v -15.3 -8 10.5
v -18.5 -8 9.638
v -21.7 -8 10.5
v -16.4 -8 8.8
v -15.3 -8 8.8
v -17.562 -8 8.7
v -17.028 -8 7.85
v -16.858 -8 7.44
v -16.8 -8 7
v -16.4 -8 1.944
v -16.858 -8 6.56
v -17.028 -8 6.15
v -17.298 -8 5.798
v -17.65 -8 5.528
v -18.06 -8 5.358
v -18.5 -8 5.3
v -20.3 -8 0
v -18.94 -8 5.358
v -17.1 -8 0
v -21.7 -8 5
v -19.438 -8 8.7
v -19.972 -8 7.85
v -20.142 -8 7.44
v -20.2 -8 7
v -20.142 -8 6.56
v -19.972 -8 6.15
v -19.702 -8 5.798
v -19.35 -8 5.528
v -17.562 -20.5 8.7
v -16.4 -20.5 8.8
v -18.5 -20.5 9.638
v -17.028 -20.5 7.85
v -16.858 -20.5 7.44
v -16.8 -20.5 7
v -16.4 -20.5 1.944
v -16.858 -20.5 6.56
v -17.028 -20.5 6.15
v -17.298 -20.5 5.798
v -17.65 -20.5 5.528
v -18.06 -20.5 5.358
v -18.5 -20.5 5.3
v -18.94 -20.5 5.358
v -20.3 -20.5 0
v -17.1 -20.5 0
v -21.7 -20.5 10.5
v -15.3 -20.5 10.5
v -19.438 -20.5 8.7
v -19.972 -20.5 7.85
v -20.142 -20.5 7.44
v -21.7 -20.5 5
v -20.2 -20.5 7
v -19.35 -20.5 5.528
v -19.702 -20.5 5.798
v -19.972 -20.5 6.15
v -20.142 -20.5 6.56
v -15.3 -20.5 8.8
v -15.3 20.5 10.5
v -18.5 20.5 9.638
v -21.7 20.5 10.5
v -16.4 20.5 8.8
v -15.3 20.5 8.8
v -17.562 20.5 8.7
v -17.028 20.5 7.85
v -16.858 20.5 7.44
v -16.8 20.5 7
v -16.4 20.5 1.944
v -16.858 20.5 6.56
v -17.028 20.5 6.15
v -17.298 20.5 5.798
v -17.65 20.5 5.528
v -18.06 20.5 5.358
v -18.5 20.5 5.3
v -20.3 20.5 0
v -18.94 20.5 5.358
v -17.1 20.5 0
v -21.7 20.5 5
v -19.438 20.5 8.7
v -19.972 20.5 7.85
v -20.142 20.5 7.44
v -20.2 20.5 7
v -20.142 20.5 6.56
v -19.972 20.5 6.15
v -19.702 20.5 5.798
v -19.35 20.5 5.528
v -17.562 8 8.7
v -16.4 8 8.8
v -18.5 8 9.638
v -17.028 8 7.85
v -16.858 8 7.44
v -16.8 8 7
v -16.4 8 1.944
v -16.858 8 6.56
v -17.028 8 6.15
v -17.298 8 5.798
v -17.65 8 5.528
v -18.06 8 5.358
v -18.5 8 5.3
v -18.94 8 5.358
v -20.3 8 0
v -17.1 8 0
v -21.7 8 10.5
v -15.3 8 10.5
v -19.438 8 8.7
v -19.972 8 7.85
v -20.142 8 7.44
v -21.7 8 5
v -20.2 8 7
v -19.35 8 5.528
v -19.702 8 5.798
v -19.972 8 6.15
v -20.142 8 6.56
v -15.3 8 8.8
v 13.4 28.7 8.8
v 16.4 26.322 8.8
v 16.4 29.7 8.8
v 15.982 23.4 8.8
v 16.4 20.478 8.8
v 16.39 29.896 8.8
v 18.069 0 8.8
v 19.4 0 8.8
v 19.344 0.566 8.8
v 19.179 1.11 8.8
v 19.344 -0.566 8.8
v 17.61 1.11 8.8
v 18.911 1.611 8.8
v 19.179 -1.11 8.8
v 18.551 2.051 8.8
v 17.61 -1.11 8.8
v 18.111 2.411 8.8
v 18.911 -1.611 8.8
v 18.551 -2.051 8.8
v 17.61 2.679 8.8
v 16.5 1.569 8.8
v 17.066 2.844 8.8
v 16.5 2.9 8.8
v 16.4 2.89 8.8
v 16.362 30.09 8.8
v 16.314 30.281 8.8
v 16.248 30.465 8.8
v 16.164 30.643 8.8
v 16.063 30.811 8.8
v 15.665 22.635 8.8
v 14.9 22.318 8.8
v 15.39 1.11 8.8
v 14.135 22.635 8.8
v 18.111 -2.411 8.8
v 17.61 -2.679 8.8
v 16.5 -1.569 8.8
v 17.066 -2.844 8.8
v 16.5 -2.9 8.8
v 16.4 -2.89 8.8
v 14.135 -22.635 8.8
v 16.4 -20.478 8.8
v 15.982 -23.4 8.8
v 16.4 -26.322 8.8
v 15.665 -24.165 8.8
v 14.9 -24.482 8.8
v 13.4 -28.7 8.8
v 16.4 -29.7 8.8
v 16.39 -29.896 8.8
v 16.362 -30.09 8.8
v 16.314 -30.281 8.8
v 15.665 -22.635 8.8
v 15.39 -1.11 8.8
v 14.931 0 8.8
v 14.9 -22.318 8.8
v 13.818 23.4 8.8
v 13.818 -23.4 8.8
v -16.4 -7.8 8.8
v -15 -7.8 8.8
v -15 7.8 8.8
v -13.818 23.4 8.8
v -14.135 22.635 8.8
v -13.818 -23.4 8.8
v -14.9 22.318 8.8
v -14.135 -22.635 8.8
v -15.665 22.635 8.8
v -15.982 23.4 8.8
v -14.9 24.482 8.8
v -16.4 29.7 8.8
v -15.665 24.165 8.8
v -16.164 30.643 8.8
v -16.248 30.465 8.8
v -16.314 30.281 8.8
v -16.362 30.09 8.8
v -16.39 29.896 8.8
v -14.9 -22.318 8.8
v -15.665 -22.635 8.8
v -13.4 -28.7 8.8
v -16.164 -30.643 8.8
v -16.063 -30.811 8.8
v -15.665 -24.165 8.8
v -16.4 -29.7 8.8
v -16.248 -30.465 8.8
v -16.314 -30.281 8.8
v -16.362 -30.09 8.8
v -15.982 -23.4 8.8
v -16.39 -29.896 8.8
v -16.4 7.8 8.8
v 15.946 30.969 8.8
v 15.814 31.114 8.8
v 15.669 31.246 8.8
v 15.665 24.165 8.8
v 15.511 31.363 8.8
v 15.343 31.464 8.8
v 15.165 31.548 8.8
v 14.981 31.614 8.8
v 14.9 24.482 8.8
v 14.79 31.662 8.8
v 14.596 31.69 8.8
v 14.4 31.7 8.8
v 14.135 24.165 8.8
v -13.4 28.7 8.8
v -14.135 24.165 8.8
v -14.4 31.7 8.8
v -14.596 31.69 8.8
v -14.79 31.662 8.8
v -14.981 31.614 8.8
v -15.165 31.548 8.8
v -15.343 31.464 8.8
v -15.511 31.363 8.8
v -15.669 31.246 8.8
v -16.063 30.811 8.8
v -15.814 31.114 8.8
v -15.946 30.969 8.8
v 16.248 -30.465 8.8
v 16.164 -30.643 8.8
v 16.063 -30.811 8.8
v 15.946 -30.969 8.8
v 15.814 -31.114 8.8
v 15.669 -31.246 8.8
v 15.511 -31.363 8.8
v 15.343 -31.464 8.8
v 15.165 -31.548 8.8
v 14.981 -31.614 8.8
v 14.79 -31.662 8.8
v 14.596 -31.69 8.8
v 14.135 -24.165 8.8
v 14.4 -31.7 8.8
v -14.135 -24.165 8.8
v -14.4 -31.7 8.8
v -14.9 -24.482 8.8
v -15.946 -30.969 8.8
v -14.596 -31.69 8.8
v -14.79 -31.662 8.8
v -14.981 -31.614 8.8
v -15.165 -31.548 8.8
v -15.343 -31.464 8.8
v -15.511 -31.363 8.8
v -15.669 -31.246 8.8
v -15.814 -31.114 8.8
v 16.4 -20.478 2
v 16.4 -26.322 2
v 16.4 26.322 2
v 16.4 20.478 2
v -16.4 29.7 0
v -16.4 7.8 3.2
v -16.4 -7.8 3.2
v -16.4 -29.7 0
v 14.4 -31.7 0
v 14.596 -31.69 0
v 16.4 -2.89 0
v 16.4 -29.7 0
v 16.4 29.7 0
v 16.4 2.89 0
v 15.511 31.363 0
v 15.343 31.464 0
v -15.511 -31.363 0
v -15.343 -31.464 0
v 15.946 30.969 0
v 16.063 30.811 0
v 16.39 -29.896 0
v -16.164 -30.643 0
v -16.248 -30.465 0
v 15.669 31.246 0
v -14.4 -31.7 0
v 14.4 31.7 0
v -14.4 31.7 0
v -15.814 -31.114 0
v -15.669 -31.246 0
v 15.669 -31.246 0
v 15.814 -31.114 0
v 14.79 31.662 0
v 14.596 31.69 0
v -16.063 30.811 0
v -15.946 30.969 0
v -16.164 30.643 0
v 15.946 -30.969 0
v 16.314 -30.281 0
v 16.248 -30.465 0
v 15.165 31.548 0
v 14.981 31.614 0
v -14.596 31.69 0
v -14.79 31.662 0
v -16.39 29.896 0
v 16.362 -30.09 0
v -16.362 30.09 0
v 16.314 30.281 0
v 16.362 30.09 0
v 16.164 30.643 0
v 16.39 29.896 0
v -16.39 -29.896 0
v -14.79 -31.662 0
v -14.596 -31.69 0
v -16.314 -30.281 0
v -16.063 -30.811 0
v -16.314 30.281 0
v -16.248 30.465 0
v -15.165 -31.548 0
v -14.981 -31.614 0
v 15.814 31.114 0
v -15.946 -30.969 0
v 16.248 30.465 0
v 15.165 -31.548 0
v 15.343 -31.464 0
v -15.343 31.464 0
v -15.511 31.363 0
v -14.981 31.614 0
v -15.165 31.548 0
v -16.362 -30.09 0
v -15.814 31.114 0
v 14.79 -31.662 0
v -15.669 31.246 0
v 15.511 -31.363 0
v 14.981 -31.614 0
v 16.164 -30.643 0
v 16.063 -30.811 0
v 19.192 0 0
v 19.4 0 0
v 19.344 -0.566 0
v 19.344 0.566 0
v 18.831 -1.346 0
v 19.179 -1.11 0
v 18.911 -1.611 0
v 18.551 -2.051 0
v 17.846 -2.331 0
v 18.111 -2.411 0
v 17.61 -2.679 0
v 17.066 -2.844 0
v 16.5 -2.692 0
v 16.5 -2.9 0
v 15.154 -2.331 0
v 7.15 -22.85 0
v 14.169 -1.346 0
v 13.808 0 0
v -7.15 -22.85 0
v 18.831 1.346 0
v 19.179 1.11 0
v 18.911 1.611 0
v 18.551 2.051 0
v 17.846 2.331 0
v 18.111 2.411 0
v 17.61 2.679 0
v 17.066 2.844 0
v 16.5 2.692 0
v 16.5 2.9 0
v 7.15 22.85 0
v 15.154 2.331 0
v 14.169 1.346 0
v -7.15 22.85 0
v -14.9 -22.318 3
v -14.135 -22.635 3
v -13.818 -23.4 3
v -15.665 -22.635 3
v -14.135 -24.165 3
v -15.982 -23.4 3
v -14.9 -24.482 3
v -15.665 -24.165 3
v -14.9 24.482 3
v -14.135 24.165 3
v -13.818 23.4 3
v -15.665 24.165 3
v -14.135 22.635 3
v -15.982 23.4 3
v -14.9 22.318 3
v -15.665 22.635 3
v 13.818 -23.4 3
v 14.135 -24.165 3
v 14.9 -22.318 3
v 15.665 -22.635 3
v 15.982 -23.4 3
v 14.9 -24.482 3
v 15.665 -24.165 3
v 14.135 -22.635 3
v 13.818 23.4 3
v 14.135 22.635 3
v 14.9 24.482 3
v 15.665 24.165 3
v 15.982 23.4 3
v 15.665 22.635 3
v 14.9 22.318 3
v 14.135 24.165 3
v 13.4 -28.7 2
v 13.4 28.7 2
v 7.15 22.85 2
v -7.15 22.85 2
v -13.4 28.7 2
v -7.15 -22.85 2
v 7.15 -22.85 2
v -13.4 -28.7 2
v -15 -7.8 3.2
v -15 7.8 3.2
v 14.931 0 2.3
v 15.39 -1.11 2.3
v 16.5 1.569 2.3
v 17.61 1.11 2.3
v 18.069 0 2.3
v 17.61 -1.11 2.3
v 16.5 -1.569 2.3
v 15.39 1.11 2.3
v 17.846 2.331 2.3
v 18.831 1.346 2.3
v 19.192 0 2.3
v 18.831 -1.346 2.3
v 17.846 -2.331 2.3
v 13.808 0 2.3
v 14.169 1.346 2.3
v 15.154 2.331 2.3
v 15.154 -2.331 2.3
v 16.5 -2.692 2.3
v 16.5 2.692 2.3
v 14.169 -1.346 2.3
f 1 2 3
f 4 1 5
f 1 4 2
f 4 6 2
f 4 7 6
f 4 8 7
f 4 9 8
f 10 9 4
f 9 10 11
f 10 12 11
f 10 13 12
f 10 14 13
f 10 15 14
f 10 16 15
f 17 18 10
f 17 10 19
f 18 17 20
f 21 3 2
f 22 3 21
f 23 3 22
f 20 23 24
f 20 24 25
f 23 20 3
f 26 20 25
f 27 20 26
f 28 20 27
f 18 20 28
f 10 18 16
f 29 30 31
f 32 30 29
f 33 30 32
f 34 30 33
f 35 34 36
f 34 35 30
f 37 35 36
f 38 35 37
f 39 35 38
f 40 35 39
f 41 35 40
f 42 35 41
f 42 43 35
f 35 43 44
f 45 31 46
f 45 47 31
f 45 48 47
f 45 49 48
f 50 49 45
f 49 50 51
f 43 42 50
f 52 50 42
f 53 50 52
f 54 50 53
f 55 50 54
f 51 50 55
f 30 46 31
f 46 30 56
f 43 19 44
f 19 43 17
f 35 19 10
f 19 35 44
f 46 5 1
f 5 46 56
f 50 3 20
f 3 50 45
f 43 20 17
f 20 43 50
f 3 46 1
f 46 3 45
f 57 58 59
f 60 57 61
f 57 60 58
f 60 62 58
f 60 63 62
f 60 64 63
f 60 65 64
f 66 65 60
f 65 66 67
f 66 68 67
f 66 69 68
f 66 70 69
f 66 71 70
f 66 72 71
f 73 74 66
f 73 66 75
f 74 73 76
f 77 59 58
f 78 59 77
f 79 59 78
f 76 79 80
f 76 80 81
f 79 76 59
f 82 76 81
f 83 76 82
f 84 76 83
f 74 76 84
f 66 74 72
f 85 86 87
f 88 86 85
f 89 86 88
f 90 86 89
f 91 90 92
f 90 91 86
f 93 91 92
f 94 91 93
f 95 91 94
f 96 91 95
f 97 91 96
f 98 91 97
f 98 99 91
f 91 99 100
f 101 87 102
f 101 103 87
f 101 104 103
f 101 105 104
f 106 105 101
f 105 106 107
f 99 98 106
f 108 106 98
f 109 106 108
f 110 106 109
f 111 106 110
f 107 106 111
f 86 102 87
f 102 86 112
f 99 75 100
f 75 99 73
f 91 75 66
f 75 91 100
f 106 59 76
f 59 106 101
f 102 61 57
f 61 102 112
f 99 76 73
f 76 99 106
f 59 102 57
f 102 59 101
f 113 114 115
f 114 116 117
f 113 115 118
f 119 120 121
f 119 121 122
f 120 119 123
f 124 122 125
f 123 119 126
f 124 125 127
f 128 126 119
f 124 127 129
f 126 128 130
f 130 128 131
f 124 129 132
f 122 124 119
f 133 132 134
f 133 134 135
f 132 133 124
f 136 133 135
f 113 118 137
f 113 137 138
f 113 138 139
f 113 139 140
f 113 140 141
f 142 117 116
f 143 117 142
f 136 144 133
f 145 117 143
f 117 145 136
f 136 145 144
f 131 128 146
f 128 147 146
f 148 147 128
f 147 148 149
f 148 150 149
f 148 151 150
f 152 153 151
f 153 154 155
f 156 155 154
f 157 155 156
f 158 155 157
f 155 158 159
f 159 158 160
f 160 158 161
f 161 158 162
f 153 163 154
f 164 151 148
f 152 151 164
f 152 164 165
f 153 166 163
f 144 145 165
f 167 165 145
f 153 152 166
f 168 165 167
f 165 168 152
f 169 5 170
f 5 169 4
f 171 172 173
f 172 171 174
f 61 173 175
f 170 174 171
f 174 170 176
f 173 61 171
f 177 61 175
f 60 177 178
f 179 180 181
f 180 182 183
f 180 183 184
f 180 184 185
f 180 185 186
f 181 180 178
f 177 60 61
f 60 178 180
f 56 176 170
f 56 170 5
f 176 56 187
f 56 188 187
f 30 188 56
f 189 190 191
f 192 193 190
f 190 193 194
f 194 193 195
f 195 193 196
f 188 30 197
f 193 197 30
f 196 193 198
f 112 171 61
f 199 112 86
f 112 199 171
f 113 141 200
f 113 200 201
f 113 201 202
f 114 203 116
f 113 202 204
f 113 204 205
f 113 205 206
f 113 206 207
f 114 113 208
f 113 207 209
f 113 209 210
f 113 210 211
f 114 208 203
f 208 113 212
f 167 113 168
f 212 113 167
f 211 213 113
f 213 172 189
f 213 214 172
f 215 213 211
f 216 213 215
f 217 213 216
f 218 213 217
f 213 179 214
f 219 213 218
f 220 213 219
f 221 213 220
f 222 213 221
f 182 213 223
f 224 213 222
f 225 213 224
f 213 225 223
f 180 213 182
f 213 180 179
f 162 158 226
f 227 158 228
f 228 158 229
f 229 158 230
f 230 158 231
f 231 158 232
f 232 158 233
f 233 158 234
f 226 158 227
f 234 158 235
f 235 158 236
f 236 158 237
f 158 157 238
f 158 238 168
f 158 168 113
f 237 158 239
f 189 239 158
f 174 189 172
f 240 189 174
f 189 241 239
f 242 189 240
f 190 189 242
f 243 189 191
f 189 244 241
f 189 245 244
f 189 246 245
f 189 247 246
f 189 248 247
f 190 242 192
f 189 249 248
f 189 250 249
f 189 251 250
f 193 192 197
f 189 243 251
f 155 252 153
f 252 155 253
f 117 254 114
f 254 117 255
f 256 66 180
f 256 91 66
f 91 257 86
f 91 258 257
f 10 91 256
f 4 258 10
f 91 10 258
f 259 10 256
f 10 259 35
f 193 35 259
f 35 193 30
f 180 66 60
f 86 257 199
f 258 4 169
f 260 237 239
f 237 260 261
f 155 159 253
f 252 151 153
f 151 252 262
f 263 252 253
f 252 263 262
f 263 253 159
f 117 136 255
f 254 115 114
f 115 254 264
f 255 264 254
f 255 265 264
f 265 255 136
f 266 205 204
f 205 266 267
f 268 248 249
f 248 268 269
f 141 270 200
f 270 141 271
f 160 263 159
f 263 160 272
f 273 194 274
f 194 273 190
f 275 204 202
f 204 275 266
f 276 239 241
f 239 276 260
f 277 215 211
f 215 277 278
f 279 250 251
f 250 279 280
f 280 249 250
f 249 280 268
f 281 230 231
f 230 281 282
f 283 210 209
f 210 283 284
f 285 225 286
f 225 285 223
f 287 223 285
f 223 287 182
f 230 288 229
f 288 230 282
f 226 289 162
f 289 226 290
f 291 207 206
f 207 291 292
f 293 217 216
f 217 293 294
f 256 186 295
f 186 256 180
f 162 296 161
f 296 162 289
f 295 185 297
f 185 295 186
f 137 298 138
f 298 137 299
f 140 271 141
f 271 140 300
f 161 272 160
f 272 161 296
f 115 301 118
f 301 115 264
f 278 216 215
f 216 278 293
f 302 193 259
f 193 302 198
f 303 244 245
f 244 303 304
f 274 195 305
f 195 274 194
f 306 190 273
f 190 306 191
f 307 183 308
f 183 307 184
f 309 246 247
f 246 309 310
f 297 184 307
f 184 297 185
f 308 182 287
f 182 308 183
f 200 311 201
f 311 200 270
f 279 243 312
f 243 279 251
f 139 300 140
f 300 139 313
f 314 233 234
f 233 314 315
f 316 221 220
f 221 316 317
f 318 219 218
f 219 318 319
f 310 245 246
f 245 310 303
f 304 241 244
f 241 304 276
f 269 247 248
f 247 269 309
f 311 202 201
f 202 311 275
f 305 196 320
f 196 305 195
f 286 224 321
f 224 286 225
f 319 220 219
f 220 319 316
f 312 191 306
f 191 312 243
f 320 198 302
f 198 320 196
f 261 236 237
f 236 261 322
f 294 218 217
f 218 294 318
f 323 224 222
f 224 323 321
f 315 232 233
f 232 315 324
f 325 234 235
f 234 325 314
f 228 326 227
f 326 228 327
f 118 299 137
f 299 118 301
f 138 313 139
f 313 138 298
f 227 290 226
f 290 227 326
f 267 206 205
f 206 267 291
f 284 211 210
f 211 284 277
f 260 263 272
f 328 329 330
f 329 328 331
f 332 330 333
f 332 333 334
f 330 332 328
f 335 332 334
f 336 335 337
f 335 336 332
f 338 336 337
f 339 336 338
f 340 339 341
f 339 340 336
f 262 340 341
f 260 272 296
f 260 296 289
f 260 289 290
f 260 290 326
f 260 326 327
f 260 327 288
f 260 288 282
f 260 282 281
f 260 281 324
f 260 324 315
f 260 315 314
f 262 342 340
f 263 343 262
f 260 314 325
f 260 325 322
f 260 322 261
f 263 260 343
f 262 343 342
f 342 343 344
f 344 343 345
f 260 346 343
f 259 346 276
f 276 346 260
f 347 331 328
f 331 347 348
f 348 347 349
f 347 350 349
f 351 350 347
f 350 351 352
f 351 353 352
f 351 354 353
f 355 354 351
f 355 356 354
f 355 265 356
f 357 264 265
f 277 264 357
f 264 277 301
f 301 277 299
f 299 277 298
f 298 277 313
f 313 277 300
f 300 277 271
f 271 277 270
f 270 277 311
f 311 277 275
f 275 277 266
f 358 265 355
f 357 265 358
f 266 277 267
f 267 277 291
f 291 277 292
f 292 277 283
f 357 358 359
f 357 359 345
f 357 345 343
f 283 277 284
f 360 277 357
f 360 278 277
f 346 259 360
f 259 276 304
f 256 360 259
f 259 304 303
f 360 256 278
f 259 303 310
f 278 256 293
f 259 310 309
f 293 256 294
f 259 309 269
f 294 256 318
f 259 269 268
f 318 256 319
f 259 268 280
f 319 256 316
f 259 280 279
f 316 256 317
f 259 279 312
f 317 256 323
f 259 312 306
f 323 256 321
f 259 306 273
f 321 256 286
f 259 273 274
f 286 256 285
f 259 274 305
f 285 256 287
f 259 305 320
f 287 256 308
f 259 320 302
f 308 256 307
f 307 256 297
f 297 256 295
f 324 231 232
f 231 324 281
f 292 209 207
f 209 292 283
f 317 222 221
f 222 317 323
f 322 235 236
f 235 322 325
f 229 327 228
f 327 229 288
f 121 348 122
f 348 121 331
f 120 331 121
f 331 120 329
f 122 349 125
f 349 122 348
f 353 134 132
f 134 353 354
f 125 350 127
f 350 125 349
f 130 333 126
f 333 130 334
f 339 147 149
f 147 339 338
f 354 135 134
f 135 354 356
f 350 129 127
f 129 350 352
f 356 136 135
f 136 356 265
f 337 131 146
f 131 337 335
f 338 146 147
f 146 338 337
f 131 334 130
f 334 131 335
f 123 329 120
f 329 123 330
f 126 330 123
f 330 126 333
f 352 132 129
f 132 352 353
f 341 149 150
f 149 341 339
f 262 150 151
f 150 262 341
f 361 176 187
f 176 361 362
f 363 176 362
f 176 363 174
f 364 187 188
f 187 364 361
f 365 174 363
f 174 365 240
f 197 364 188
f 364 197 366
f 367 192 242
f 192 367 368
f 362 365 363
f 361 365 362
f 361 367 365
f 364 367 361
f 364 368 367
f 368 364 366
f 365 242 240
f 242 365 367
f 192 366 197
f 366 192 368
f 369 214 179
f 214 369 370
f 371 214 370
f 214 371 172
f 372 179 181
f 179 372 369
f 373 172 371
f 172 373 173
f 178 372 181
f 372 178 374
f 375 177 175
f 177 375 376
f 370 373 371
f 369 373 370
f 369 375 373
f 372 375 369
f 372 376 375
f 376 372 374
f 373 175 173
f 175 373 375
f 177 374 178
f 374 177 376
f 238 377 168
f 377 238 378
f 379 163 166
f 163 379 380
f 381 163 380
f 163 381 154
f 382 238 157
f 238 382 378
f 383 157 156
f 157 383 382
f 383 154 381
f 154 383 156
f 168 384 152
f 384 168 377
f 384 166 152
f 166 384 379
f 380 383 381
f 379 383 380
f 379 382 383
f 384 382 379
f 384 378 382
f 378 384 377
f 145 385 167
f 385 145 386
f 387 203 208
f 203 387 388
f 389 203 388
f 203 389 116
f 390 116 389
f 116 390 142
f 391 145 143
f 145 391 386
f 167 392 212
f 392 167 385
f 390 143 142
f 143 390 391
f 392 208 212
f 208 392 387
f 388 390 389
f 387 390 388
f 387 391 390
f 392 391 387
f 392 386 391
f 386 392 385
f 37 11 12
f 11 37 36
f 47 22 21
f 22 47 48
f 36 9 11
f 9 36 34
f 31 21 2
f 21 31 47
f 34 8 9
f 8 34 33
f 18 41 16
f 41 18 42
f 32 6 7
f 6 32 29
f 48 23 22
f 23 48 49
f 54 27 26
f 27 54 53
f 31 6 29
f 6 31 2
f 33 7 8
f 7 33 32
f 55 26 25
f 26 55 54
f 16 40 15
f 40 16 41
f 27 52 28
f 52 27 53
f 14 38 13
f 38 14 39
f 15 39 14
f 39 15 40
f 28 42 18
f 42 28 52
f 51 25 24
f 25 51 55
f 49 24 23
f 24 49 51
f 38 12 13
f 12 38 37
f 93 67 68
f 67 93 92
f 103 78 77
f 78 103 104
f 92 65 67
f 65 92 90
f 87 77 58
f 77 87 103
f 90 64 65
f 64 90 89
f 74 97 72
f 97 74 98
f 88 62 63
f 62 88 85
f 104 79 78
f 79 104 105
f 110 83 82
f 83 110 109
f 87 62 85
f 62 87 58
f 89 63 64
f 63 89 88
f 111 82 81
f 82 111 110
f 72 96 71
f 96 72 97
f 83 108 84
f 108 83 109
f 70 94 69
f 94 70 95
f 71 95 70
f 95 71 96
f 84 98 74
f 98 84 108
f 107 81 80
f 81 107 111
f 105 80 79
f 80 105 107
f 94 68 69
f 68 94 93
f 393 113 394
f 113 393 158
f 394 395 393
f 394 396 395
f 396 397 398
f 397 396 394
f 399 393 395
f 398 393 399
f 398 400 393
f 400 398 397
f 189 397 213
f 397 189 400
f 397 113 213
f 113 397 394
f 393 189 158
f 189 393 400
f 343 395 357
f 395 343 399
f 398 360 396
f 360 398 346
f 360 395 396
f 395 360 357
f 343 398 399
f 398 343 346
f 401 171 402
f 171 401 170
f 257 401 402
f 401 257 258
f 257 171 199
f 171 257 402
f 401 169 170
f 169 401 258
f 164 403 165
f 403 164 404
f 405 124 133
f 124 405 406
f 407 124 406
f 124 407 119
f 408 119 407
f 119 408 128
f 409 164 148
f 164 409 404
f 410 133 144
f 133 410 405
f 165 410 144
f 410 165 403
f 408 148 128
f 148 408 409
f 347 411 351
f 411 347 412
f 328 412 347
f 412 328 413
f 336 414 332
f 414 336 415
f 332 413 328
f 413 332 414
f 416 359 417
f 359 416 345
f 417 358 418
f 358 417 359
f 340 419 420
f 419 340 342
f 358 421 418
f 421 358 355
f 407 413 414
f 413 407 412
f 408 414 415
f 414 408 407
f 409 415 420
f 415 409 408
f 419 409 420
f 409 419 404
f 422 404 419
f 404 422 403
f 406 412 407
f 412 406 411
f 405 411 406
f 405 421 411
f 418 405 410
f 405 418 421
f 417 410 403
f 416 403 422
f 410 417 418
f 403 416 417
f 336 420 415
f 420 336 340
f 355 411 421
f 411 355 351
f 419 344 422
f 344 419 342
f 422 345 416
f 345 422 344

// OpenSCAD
// =====================================================================
// child_lcd_cradle.scad — hinged NHD-C0216CiZ LCD door + rear clamps
//
// Print coordinates: X = LCD short side, Y = LCD long side, Z = depth.
// The visible bezel face is on the bed (Z=0), so both variants print without
// support. The left edge has two support-free hinge leaves; a single recessed
// M2.5 screw at the right releases the door for C-MAIN service.
// =====================================================================

include <../../../../../scad/lib/util.scad>;

/* [Output] */
part = 0;                        // [0:bezel,1:clamp]

/* [LCD — Newhaven NHD-C0216CiZ-FSW-FBW-3V3] */
lcd_w = 26.2;                   // short side
lcd_l = 56.8;                   // long side
lcd_body_h = 5.5;
view_w = 14.3;                  // visible area, short side
view_l = 45.7;                  // visible area, long side
fit = 0.6;                      // 0.3 mm per side
foam_t = 0.8;                   // thin closed-cell foam around the front rim

/* [Bezel] */
wall = 3.0;
front_t = 2.0;
pocket_h = lcd_body_h + foam_t + 0.5;
corner_r = 2.0;
hinge_x = -18.5;                // vertical hinge axis, kept inside tube envelope
hinge_pin_d = 3.4;              // M3 threaded rod captured by both LCD support arches (2026-08-28)
hinge_block_w = 6.4;
hinge_block_h = 10.5;
hinge_axis_z = 7.0;
hinge_segments = [[-20.5,-8.0],[8.0,20.5]];   // shortened 2026-08-28 so the rear clamp bars (|y| = clamp_y ± 2.5) clear the leaves

/* [One-screw latch] */
latch_x = 16.5;
latch_clear_d = 2.9;            // M2.5 clearance
latch_head_d = 5.2;             // low-profile head, recessed flush
latch_head_h = 2.2;
latch_boss_d = 5.8;

/* [Rear clamps] */
clamp_w = 5.0;
clamp_t = 2.5;
clamp_screw = 2.5;
clamp_clear_d = 2.9;
clamp_pilot_d = 2.0;
clamp_x = lcd_w/2 + fit/2 + wall/2;
clamp_y = lcd_l/2 - 5.0;        // 23.4: bars press the LCD ends, between the hinge leaves and the plate end
end_wall = wall;
rear_foam_c = 0.5;              // 0.8 closed-cell foam strip under each bar, compressed to 0.5
clamp_seat_h = front_t + foam_t + lcd_body_h + rear_foam_c;     // 8.8 from bezel front (= total_h)
// Bars must stay below the hinge pin (world Y 35.0..38.0): bar top = 43.5-8.8 = 34.7

/* [Fixed-frame knuckle clearance] */
// child_lcd_hinge_frame's centre knuckle (x hinge_x ± 3.2, y ±7.5, world Y 27..40)
// used to cut 1.1 mm into the door plate edge. Notch the plate around it.
knuckle_w = 6.4;
knuckle_y = 7.5;
knuckle_top_world_y = 40.0;     // frame origin 27 + hinge_block_h 13
door_front_world_y = 43.5;
knuckle_clear = 0.3;
notch_x1 = hinge_x + knuckle_w/2 + knuckle_clear;                 // -15.0
notch_z0 = door_front_world_y - knuckle_top_world_y - knuckle_clear;  // 3.2 (print z)

$fa = 4;
$fs = 0.3;

pocket_w = lcd_w + fit;
pocket_l = lcd_l + fit;
outer_w = pocket_w + 2*wall;
outer_l = pocket_l + 2*end_wall;
assert(clamp_y - clamp_w/2 >= hinge_segments[1][1], "clamp bar overlaps the hinge leaves");
assert(clamp_y + clamp_w/2 <= lcd_l/2 + 2, "clamp bar misses the LCD end");
total_h = front_t + pocket_h;

assert(view_w < lcd_w - 2, "LCD window exceeds module short side");
assert(view_l < lcd_l - 2, "LCD window exceeds module long side");
assert(notch_x1 <= -(pocket_w/2) - 1.5, "knuckle notch leaves < 1.5 mm wall beside the LCD pocket");
assert(notch_z0 > front_t, "knuckle notch would cut the front bezel plate");
assert(latch_x-latch_clear_d/2 > pocket_w/2+1.5,
       "Latch hole leaves too little wall beside the LCD pocket");

module hinge_leaf(y0,y1) {
    // A 45-degree ramp grows the leaf outwards without a support island.
    union() {
        hull() {
            translate([hinge_x-1.8,y0,0]) cube([3.2,y1-y0,0.01]);
            translate([hinge_x-hinge_block_w/2,y0,5.0])
                cube([hinge_block_w,y1-y0,0.01]);
        }
        translate([hinge_x-hinge_block_w/2,y0,5.0])
            cube([hinge_block_w,y1-y0,hinge_block_h-5.0]);
    }
}

module rounded_plate(w, l, h, r=2) {
    translate([-w/2, -l/2, 0]) rrect_prism(w, l, h, r);
}

module bezel() {
    difference() {
        union() {
            rounded_plate(outer_w, outer_l, total_h, corner_r);
            for (seg=hinge_segments) hinge_leaf(seg[0],seg[1]);
            translate([latch_x,0,0]) cylinder(d=latch_boss_d,h=total_h,$fn=32);
            // Four pilots for the removable rear clamp bars, confined to the plate
            // outline so they cannot reach the hinge rod (x < -16.4).
            intersection() {
                union() for (sx=[-1,1], sy=[-1,1])
                    translate([sx*clamp_x, sy*clamp_y, front_t])
                        cylinder(d=wall+clamp_pilot_d+1.6, h=clamp_seat_h-front_t, $fn=32);
                translate([-outer_w/2, -outer_l/2, -1]) cube([outer_w, outer_l, total_h+2]);   // plain cube keeps the STEP clean
            }
        }

        // LCD pocket opens from the rear, leaving the visible front bezel.
        translate([-pocket_w/2, -pocket_l/2, front_t])
            cube([pocket_w, pocket_l, pocket_h+0.2]);
        translate([-view_w/2, -view_l/2, -0.1])
            cube([view_w, view_l, front_t+0.2]);

        // Clamp screws enter from the rear; blind pilots retain material at face.
        for (sx=[-1,1], sy=[-1,1])
            translate([sx*clamp_x, sy*clamp_y, front_t+1.0])
                hole(clamp_pilot_d, pocket_h, fn=8, through=false);

        // Notch for the fixed frame's centre knuckle (between the two door leaves).
        translate([-outer_w/2-1, -knuckle_y-knuckle_clear, notch_z0])
            cube([notch_x1-(-outer_w/2-1), 2*(knuckle_y+knuckle_clear), total_h]);

        // M3 hinge pin. The pointed top faces +Z in the flat print orientation.
        for (seg=hinge_segments)
            translate([hinge_x,seg[0]-0.1,hinge_axis_z])
                rotate([0,0,90]) teardrop_bore(hinge_pin_d,seg[1]-seg[0]+0.2);

        // One recessed M2.5 screw releases the complete LCD door. Fit a small
        // O-ring on the rear of its shank after assembly to make it captive.
        translate([latch_x,0,-0.1]) hole(latch_clear_d,total_h+0.2,fn=8);
        translate([latch_x,0,-0.1]) hole(latch_head_d,latch_head_h+0.1,fn=12);
    }
}

module clamp_bar(sy) {
    difference() {
        translate([-outer_w/2-2, sy*(clamp_y-clamp_w/2), 0])
            cube([outer_w+4, clamp_w, clamp_t]);
        for (sx=[-1,1])
            translate([sx*clamp_x, sy*clamp_y, -0.1])
                hole(clamp_clear_d, clamp_t+0.2, fn=8);
    }
}

// One bar centred on its own axis (for assembly placement at y = ±clamp_y).
module clamp_bar_single() {
    difference() {
        translate([-outer_w/2-2, -clamp_w/2, 0]) cube([outer_w+4, clamp_w, clamp_t]);
        for (sx=[-1,1])
            translate([sx*clamp_x, 0, -0.1]) hole(clamp_clear_d, clamp_t+0.2, fn=8);
    }
}

echo(str("child_lcd_cradle: clamp bar seat z=", clamp_seat_h, " clamp_y=±", clamp_y,
         " clamp_x=±", clamp_x, " notch x<=", notch_x1, " z>=", notch_z0));

if (part == 0) bezel();
else if (part == 2) clamp_bar_single();
else if (part == 1) {
    // One STL intentionally contains both identical bars; print one build plate.
    translate([0, -8, 0]) clamp_bar(1);
    translate([0,  8, 0]) clamp_bar(-1);
}
